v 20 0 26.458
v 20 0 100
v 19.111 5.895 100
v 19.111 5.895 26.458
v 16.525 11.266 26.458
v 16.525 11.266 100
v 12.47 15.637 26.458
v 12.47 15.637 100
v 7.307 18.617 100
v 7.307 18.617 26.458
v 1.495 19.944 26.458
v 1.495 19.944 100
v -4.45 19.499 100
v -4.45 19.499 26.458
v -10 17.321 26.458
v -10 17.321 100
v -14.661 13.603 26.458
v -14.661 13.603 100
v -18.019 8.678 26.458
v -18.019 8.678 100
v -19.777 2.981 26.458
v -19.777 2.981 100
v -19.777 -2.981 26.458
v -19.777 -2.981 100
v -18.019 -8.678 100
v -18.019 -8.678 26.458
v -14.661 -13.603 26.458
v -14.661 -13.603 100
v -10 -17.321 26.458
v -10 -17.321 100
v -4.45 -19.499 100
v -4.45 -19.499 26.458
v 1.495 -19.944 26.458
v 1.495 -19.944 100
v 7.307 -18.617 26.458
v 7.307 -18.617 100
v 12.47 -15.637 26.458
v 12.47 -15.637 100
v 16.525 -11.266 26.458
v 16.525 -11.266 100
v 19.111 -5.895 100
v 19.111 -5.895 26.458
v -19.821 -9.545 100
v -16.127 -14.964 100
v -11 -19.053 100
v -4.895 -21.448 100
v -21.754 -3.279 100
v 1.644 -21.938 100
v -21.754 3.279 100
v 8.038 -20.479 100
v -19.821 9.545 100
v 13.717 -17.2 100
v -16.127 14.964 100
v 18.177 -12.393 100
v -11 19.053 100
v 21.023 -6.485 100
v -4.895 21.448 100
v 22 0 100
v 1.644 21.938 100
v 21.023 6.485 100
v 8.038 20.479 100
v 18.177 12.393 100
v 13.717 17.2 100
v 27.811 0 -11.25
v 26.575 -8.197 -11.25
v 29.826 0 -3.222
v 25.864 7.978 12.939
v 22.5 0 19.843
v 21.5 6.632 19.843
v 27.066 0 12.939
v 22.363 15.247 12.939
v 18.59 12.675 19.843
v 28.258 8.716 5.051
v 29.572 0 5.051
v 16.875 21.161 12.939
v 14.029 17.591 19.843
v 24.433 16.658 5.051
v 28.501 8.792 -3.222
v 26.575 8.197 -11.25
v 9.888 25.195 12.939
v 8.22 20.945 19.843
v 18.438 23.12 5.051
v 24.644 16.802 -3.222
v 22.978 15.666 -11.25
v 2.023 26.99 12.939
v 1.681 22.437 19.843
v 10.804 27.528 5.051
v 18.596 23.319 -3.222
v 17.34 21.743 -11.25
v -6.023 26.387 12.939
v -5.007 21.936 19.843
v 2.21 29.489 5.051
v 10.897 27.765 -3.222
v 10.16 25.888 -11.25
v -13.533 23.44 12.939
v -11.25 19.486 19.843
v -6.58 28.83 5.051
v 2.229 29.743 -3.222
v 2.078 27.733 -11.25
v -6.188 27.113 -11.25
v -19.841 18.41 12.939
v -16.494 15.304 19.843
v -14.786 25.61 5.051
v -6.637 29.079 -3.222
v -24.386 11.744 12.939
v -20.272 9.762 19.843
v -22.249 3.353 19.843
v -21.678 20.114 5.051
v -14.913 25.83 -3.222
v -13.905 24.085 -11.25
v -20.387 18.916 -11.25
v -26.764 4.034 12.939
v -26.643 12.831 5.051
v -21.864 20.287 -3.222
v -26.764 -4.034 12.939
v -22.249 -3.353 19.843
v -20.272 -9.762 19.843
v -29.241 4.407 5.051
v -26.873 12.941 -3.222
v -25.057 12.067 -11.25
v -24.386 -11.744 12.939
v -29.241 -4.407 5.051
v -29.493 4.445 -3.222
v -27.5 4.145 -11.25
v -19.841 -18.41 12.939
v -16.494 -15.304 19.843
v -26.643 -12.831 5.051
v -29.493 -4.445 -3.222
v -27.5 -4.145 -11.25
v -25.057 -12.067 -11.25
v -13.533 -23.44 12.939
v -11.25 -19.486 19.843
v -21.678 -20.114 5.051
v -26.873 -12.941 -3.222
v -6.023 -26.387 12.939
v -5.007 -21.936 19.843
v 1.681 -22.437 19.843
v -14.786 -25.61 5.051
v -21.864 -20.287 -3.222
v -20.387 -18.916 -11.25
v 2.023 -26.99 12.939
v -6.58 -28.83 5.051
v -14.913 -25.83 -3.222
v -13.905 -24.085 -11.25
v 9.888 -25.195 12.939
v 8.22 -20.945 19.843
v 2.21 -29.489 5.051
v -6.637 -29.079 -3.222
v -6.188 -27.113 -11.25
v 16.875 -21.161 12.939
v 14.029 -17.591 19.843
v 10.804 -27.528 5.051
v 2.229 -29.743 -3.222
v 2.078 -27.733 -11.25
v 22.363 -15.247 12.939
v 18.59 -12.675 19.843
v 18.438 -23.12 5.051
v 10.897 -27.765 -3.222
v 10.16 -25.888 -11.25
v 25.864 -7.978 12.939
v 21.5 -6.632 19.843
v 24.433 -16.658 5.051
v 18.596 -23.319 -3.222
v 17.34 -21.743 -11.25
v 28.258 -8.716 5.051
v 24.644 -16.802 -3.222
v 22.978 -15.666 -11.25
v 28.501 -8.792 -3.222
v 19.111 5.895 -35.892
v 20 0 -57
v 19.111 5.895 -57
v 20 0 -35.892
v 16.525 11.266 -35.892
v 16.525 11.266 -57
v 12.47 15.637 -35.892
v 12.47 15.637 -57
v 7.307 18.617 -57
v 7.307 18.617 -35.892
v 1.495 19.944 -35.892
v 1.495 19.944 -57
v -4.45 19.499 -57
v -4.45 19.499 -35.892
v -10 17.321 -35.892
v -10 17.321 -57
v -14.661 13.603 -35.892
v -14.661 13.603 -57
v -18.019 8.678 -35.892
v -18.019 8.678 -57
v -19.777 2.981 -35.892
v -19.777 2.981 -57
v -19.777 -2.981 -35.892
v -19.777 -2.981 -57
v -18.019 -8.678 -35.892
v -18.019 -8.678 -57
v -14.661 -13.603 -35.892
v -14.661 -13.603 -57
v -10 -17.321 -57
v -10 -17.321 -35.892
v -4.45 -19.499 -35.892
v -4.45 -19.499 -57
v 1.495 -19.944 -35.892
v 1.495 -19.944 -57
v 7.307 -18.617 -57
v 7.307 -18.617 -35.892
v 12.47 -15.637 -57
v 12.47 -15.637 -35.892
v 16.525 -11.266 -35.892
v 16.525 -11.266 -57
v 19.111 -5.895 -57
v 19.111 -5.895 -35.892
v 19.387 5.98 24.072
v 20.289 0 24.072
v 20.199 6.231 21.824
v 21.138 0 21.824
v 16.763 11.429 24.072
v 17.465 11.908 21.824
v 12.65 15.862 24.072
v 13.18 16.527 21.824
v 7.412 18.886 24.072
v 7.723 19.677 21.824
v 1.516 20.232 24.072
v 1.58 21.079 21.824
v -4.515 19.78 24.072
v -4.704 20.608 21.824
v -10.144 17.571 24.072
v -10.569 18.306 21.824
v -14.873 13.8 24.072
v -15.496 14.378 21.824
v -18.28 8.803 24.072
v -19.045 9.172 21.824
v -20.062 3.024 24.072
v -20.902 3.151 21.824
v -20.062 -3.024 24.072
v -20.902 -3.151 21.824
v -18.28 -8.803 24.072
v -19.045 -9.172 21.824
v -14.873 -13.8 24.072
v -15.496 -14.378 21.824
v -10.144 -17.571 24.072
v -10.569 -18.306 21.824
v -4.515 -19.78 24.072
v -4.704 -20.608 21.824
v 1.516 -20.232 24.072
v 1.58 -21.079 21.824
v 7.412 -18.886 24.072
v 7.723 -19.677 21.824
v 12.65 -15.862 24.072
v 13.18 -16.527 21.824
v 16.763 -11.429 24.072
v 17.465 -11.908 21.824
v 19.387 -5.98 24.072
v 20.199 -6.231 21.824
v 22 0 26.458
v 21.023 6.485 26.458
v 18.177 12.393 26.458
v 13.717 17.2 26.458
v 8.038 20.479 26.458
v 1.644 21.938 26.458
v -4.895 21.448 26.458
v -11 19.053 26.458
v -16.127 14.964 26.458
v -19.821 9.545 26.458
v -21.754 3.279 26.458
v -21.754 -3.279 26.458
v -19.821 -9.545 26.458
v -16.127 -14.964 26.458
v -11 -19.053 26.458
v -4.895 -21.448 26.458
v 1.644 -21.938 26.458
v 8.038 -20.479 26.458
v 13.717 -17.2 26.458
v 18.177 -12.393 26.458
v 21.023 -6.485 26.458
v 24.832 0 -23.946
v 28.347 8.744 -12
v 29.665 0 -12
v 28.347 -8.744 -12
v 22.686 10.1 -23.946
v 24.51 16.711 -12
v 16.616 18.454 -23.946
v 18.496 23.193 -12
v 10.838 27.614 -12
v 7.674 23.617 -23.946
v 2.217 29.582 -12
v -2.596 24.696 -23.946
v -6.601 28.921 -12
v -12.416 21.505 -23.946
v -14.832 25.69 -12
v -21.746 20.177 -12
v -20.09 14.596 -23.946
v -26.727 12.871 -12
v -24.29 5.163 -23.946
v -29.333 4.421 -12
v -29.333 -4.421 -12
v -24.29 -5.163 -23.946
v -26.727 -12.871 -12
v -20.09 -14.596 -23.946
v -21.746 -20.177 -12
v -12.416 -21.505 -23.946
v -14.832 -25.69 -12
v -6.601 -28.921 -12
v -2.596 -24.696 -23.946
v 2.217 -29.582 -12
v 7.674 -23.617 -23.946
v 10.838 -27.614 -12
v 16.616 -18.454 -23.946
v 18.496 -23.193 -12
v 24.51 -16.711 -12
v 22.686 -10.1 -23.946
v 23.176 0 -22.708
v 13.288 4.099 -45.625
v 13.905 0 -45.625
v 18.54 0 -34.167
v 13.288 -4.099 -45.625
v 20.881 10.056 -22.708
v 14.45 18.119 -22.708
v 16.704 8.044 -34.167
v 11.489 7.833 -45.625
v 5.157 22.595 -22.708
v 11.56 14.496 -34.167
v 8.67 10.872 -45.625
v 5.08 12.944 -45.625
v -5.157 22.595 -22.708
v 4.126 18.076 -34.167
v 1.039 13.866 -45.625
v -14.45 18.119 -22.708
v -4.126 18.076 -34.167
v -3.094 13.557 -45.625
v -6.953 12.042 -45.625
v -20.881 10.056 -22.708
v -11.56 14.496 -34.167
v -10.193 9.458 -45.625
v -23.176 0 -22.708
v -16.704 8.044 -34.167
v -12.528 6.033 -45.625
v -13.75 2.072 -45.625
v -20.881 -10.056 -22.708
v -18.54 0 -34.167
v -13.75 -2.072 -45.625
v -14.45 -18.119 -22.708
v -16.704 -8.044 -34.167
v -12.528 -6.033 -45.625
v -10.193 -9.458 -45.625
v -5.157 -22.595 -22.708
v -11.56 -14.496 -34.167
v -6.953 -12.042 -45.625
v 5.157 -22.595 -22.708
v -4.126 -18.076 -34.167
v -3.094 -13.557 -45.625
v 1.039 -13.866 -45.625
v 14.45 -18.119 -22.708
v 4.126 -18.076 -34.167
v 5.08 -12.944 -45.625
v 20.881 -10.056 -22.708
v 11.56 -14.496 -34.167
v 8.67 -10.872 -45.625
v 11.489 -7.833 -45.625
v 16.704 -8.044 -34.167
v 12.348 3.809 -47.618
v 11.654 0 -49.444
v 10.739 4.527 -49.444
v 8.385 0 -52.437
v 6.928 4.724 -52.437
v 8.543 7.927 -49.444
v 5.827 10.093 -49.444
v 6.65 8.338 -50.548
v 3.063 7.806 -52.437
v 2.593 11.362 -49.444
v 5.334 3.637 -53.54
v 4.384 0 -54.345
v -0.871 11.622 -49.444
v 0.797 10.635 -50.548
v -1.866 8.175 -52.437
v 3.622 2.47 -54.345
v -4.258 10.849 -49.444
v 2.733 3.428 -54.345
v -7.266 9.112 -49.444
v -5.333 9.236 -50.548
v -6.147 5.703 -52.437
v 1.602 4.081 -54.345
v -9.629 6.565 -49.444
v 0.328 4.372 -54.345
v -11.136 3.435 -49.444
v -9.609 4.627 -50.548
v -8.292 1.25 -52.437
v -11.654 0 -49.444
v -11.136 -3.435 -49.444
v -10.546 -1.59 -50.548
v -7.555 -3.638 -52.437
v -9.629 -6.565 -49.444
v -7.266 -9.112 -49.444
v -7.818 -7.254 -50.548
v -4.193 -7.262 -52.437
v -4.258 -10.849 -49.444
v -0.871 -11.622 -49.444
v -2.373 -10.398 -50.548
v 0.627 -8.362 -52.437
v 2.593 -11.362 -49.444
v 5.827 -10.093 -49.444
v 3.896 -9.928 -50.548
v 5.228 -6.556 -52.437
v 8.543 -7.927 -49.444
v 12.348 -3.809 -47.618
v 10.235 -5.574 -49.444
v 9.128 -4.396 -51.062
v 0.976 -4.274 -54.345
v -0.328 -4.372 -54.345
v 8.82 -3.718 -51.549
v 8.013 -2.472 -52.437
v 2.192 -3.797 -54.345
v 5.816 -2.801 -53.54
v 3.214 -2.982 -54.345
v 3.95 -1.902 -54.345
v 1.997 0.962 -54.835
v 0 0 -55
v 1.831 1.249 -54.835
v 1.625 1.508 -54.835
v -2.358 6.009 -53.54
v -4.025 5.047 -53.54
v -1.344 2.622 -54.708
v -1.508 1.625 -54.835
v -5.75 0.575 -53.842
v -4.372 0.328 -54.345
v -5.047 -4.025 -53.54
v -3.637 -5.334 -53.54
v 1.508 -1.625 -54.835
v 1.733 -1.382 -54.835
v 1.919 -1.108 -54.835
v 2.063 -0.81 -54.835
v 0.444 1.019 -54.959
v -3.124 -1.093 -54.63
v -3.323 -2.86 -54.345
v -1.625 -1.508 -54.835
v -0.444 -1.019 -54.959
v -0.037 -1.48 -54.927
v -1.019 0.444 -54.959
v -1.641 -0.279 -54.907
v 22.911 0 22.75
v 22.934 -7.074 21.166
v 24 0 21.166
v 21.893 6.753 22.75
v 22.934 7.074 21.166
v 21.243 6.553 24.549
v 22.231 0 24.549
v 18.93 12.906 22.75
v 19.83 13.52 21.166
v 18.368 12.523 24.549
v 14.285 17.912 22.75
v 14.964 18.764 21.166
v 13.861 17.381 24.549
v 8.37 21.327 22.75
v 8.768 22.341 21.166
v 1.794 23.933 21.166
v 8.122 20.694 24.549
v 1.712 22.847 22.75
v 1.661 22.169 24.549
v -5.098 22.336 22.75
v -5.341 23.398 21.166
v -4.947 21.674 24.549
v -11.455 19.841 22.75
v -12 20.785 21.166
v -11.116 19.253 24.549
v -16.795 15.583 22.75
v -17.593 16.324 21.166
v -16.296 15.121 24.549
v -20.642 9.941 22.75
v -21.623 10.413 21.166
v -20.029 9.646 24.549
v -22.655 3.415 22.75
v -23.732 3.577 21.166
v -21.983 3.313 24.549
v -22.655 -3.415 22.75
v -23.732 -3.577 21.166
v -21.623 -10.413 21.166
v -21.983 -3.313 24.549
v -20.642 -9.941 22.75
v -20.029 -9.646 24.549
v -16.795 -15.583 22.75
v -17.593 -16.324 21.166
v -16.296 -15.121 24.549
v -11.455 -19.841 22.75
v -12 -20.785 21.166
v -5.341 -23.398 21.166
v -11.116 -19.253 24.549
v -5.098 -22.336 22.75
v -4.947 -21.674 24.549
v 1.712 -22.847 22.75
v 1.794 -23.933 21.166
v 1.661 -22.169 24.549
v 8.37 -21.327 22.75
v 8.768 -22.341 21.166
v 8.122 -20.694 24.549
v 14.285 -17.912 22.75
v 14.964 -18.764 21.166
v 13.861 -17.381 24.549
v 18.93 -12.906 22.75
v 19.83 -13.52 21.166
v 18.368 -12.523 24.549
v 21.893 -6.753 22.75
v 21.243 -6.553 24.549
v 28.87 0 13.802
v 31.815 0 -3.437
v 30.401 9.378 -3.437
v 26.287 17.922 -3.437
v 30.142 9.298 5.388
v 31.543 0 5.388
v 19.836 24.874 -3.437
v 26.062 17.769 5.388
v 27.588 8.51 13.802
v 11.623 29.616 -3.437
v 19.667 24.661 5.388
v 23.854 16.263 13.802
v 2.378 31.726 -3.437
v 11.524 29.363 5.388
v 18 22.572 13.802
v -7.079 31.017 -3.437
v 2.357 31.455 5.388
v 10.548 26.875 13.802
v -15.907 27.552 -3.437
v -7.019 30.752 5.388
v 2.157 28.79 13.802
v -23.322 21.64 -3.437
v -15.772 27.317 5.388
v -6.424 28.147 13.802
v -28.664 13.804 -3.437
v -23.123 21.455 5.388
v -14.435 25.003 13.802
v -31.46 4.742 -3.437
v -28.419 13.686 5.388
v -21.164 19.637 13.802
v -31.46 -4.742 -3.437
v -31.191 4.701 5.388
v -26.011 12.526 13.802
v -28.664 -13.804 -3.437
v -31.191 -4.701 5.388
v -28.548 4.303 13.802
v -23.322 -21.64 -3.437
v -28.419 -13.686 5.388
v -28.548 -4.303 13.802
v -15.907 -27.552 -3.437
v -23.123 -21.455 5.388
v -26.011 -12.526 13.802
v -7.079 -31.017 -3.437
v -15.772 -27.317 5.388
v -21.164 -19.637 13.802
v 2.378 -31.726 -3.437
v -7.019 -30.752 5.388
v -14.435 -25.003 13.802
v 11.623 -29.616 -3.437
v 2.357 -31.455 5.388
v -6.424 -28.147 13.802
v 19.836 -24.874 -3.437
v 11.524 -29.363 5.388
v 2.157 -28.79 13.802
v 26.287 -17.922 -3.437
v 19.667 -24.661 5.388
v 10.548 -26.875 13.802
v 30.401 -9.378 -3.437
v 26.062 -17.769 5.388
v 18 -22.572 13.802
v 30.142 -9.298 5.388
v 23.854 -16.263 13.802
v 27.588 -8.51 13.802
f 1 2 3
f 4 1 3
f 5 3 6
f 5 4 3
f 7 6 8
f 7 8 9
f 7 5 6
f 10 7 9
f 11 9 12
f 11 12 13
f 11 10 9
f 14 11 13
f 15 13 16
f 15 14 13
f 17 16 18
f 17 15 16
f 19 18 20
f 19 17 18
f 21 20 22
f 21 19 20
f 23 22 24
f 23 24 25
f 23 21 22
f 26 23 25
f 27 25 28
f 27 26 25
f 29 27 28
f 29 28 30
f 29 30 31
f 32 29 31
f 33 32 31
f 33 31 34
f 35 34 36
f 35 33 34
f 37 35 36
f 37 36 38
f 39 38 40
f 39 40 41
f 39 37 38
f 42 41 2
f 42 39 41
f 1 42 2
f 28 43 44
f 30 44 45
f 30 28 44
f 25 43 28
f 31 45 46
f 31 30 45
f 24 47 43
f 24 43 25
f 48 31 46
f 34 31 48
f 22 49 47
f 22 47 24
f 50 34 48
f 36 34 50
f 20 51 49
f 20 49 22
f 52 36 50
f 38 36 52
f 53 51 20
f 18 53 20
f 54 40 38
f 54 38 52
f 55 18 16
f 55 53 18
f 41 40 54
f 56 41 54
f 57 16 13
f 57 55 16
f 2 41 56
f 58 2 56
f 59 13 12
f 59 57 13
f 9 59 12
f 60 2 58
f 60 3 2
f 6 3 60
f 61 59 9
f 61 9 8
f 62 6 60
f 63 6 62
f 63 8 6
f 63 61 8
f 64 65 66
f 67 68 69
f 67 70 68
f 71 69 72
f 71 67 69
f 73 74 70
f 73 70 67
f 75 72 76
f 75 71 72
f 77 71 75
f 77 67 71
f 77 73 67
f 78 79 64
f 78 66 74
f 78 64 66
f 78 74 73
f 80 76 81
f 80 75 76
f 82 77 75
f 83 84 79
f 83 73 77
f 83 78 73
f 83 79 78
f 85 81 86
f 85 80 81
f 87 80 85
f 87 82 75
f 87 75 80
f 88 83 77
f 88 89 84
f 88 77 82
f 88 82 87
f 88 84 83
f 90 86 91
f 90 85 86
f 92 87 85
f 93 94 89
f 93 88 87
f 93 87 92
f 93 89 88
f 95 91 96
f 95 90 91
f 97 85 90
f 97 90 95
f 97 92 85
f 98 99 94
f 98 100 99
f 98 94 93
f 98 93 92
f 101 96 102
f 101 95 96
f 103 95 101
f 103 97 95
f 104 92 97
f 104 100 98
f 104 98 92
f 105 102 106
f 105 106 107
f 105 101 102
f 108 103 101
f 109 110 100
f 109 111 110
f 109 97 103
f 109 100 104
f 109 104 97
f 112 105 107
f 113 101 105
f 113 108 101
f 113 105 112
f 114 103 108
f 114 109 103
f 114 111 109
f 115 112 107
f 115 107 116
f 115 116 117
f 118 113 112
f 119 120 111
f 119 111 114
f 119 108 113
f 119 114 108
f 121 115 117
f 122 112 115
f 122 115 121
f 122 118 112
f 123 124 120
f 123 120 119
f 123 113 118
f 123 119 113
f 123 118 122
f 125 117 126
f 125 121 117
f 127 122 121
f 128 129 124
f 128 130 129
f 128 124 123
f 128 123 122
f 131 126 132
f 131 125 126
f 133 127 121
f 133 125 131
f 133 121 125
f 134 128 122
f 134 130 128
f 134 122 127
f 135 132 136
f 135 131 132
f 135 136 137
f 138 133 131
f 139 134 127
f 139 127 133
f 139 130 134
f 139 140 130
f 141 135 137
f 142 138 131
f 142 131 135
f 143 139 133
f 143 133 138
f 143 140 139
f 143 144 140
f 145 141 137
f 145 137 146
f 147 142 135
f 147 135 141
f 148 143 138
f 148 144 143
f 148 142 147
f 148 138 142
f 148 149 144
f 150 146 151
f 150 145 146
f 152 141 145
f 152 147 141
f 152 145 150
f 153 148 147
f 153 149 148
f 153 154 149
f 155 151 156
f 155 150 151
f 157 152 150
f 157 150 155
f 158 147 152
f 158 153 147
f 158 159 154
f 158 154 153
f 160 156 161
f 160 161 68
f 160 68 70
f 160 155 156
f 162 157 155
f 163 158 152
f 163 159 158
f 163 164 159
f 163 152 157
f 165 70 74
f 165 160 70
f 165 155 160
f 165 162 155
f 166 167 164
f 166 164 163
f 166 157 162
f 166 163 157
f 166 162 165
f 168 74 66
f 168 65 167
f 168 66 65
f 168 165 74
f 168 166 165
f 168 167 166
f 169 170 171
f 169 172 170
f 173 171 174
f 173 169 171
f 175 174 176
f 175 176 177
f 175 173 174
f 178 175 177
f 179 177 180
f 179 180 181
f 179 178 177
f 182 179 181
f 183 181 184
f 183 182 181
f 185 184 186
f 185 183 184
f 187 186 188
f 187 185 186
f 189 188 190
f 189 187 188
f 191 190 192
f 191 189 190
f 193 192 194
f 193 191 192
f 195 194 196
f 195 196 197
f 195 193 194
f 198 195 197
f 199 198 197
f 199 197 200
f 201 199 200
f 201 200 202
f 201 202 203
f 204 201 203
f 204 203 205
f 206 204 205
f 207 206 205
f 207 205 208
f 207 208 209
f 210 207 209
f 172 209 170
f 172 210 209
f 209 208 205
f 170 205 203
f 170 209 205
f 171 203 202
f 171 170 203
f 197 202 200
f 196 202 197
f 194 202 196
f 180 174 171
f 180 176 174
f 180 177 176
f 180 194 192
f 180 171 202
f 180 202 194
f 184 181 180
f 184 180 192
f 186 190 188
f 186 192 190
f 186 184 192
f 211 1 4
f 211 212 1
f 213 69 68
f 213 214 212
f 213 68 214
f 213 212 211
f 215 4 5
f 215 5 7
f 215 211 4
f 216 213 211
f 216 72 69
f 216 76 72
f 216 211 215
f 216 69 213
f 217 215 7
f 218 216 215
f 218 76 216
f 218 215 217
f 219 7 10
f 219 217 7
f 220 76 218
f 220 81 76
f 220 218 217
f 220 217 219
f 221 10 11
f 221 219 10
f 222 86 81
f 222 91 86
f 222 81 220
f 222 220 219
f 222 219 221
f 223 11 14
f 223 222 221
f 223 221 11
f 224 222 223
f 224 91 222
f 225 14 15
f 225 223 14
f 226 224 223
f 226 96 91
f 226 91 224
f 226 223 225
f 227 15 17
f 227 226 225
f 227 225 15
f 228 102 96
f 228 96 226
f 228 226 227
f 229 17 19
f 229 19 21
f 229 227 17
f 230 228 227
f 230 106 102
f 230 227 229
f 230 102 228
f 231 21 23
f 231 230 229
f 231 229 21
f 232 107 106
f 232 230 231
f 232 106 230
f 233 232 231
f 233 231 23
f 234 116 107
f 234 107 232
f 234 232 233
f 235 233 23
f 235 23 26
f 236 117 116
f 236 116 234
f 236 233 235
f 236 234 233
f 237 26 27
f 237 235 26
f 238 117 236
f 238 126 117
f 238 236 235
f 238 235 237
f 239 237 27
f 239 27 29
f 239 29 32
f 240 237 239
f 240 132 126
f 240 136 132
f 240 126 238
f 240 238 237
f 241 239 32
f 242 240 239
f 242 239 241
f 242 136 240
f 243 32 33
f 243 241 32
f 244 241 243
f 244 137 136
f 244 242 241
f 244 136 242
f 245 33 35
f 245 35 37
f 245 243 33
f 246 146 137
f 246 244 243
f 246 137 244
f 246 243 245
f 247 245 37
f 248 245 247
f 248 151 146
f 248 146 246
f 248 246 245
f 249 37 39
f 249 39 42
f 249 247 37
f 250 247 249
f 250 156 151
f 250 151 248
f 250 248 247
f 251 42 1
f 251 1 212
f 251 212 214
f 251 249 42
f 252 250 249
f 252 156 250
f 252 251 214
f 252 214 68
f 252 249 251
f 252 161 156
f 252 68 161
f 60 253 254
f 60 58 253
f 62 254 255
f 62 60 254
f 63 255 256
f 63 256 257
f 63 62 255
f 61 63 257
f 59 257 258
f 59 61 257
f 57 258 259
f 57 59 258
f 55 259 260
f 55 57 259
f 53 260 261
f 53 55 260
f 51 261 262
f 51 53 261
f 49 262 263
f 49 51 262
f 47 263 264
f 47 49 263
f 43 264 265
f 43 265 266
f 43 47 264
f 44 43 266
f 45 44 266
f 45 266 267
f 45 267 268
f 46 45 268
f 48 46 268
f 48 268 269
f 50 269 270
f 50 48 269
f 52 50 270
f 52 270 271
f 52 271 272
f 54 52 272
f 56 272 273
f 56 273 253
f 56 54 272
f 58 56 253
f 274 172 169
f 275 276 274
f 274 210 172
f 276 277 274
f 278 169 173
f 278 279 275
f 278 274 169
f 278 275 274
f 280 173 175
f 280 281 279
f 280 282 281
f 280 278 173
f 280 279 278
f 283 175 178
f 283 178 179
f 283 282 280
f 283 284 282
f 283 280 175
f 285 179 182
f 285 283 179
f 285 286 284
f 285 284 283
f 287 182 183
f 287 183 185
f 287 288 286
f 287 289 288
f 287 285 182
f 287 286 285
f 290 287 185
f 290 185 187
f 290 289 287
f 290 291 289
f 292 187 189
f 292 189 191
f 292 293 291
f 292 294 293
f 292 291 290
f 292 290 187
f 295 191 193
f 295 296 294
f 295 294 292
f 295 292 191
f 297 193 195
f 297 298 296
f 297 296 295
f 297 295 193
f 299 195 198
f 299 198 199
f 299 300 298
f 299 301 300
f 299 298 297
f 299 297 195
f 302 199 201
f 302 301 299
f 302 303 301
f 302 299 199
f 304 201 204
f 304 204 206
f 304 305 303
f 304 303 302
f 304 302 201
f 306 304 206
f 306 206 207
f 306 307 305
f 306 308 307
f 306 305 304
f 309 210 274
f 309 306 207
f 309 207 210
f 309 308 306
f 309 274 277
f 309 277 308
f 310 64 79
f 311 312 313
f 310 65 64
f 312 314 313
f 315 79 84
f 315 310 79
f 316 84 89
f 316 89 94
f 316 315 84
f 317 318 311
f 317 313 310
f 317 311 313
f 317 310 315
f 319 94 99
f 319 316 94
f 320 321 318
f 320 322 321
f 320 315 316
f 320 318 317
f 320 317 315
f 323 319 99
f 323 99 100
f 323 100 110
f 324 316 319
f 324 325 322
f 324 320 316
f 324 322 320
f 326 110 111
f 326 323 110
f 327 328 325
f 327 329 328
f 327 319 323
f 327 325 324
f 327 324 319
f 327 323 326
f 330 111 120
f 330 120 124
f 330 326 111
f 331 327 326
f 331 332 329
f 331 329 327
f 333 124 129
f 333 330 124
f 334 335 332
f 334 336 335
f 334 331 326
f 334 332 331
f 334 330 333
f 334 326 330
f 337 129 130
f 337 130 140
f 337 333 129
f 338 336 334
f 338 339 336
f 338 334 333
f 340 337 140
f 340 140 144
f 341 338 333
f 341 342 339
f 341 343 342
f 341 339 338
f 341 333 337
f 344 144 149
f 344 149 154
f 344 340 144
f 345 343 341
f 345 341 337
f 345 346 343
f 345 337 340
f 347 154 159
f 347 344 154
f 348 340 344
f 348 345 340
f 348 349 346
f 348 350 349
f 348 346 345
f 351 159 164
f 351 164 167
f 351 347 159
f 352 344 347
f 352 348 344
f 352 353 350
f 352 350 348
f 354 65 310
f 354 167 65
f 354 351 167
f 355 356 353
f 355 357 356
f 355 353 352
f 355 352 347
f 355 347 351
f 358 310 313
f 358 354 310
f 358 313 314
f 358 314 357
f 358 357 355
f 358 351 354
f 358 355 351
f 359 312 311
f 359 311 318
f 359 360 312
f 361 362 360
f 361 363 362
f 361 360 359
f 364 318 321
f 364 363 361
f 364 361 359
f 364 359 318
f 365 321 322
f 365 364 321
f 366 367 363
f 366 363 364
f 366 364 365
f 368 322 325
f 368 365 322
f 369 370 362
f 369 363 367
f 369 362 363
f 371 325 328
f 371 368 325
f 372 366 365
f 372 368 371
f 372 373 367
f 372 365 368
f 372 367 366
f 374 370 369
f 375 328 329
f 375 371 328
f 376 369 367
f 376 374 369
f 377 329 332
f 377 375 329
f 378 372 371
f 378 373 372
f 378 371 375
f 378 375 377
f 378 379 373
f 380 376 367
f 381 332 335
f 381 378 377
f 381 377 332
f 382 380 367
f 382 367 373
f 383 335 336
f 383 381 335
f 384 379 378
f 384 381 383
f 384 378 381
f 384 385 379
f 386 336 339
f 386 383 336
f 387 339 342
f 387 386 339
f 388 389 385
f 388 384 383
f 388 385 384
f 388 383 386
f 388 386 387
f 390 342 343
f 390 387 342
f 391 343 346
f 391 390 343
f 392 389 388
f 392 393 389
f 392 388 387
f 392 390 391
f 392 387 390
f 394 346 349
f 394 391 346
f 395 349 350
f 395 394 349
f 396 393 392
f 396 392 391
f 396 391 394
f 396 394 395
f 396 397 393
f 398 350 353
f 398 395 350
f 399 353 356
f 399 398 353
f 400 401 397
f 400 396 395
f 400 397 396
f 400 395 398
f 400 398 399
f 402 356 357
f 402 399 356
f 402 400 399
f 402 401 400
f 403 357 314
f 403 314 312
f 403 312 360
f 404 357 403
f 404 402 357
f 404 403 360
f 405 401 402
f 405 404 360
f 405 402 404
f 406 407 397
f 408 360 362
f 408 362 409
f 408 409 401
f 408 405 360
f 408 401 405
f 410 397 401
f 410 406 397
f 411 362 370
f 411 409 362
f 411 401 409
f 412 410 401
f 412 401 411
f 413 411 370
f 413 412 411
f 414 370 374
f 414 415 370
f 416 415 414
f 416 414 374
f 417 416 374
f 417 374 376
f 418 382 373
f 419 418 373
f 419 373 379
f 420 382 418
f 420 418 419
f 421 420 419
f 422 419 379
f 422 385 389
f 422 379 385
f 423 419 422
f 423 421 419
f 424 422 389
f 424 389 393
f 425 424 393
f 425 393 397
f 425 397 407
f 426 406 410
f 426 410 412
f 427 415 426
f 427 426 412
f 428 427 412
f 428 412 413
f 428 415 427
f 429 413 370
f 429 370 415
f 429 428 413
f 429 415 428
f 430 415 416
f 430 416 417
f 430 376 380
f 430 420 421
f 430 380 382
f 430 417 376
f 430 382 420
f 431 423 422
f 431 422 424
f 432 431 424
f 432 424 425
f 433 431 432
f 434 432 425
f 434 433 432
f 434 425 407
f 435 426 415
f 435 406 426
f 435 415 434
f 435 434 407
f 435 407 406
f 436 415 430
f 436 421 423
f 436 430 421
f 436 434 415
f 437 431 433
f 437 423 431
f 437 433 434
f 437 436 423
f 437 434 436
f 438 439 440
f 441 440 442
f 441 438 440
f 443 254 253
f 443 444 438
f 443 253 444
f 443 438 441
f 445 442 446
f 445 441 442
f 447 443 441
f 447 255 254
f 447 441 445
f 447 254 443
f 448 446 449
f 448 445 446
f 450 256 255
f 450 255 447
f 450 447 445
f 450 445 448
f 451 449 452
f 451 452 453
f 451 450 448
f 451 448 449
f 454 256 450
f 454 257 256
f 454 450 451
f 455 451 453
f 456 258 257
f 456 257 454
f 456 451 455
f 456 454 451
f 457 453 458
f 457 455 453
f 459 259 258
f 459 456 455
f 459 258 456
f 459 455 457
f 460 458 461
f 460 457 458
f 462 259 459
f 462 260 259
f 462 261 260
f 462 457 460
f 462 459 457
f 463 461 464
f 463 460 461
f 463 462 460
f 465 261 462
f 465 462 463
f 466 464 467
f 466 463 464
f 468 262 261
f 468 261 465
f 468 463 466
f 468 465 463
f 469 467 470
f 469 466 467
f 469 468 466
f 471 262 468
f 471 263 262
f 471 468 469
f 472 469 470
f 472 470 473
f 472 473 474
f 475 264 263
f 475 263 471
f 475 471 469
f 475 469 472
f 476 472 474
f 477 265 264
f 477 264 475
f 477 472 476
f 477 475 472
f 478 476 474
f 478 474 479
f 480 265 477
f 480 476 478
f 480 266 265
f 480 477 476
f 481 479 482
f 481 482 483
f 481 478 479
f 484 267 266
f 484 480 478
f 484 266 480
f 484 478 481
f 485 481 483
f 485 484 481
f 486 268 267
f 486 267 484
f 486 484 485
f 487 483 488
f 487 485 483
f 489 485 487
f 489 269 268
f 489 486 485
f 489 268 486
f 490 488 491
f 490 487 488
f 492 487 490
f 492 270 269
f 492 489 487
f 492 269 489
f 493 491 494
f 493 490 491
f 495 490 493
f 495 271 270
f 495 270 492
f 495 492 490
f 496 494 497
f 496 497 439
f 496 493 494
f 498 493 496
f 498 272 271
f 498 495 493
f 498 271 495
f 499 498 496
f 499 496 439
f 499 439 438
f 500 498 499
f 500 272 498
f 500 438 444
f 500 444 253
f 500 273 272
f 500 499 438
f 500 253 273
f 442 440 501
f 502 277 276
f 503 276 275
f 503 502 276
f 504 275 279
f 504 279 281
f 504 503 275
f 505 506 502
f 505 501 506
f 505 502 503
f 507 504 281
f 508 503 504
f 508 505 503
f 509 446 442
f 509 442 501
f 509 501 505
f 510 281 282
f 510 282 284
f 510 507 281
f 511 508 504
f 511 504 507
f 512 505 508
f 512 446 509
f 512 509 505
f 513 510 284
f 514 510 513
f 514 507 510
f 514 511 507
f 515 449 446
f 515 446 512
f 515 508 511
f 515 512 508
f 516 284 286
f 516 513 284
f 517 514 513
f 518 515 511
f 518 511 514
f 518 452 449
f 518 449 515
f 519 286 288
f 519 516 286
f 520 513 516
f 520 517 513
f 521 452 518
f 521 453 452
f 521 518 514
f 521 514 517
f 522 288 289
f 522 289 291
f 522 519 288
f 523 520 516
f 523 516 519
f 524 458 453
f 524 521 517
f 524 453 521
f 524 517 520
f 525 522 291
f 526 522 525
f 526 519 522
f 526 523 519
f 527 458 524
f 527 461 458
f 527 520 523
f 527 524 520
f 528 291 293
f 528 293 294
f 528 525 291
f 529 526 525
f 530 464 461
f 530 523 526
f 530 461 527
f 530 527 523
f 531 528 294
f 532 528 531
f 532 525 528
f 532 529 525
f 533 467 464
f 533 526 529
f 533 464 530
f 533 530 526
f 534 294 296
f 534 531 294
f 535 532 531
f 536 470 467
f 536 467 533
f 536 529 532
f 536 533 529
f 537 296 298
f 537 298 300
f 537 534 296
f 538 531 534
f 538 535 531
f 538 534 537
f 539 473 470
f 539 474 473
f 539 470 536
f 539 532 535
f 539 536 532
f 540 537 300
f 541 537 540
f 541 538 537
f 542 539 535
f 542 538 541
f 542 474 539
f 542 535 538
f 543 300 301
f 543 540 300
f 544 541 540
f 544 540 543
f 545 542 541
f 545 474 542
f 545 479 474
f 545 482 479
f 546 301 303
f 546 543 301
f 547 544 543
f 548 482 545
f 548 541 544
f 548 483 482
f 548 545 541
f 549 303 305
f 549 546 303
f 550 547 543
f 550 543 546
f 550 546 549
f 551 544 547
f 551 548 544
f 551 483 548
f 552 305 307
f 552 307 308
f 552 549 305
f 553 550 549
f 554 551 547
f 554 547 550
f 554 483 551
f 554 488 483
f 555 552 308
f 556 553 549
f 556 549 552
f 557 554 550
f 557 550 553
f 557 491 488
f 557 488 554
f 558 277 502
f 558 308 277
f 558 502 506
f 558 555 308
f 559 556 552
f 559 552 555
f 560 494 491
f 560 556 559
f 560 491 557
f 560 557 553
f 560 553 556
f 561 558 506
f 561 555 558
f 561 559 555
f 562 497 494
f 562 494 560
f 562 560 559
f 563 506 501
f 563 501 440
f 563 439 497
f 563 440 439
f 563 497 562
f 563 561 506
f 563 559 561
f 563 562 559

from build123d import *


with BuildPart() as f1:
    # F0 (on Front) → F1 (revolve)
    with BuildSketch(Plane.XZ):
        with BuildLine():
            ThreePointArc((22.5, 19.843135), (29.571752, 5.05089), (27.810744, -11.25))
            Line((27.810744, -11.25), (13.905372, -45.625))
            ThreePointArc((13.905372, -45.625), (8.385255, -52.437343), (0, -55))
            Line((0, -55), (0, -57))
            Line((0, -57), (20, -57))
            Line((20, -57), (20, -35.89201))
            Line((20, -35.89201), (29.664794, -12))
            ThreePointArc((29.664794, -12), (31.543202, 5.387616), (24, 21.16601))
            ThreePointArc((24, 21.16601), (22.516685, 23.629086), (22, 26.457513))
            Line((22, 26.457513), (22, 100))
            Line((22, 100), (20, 100))
            Line((20, 100), (20, 26.457513))
            ThreePointArc((20, 26.457513), (20.645857, 22.921979), (22.5, 19.843135))
        make_face()
    revolve(axis=Axis((0, 0, 55.570815), (0, 0, 1)))


solid = f1.part
